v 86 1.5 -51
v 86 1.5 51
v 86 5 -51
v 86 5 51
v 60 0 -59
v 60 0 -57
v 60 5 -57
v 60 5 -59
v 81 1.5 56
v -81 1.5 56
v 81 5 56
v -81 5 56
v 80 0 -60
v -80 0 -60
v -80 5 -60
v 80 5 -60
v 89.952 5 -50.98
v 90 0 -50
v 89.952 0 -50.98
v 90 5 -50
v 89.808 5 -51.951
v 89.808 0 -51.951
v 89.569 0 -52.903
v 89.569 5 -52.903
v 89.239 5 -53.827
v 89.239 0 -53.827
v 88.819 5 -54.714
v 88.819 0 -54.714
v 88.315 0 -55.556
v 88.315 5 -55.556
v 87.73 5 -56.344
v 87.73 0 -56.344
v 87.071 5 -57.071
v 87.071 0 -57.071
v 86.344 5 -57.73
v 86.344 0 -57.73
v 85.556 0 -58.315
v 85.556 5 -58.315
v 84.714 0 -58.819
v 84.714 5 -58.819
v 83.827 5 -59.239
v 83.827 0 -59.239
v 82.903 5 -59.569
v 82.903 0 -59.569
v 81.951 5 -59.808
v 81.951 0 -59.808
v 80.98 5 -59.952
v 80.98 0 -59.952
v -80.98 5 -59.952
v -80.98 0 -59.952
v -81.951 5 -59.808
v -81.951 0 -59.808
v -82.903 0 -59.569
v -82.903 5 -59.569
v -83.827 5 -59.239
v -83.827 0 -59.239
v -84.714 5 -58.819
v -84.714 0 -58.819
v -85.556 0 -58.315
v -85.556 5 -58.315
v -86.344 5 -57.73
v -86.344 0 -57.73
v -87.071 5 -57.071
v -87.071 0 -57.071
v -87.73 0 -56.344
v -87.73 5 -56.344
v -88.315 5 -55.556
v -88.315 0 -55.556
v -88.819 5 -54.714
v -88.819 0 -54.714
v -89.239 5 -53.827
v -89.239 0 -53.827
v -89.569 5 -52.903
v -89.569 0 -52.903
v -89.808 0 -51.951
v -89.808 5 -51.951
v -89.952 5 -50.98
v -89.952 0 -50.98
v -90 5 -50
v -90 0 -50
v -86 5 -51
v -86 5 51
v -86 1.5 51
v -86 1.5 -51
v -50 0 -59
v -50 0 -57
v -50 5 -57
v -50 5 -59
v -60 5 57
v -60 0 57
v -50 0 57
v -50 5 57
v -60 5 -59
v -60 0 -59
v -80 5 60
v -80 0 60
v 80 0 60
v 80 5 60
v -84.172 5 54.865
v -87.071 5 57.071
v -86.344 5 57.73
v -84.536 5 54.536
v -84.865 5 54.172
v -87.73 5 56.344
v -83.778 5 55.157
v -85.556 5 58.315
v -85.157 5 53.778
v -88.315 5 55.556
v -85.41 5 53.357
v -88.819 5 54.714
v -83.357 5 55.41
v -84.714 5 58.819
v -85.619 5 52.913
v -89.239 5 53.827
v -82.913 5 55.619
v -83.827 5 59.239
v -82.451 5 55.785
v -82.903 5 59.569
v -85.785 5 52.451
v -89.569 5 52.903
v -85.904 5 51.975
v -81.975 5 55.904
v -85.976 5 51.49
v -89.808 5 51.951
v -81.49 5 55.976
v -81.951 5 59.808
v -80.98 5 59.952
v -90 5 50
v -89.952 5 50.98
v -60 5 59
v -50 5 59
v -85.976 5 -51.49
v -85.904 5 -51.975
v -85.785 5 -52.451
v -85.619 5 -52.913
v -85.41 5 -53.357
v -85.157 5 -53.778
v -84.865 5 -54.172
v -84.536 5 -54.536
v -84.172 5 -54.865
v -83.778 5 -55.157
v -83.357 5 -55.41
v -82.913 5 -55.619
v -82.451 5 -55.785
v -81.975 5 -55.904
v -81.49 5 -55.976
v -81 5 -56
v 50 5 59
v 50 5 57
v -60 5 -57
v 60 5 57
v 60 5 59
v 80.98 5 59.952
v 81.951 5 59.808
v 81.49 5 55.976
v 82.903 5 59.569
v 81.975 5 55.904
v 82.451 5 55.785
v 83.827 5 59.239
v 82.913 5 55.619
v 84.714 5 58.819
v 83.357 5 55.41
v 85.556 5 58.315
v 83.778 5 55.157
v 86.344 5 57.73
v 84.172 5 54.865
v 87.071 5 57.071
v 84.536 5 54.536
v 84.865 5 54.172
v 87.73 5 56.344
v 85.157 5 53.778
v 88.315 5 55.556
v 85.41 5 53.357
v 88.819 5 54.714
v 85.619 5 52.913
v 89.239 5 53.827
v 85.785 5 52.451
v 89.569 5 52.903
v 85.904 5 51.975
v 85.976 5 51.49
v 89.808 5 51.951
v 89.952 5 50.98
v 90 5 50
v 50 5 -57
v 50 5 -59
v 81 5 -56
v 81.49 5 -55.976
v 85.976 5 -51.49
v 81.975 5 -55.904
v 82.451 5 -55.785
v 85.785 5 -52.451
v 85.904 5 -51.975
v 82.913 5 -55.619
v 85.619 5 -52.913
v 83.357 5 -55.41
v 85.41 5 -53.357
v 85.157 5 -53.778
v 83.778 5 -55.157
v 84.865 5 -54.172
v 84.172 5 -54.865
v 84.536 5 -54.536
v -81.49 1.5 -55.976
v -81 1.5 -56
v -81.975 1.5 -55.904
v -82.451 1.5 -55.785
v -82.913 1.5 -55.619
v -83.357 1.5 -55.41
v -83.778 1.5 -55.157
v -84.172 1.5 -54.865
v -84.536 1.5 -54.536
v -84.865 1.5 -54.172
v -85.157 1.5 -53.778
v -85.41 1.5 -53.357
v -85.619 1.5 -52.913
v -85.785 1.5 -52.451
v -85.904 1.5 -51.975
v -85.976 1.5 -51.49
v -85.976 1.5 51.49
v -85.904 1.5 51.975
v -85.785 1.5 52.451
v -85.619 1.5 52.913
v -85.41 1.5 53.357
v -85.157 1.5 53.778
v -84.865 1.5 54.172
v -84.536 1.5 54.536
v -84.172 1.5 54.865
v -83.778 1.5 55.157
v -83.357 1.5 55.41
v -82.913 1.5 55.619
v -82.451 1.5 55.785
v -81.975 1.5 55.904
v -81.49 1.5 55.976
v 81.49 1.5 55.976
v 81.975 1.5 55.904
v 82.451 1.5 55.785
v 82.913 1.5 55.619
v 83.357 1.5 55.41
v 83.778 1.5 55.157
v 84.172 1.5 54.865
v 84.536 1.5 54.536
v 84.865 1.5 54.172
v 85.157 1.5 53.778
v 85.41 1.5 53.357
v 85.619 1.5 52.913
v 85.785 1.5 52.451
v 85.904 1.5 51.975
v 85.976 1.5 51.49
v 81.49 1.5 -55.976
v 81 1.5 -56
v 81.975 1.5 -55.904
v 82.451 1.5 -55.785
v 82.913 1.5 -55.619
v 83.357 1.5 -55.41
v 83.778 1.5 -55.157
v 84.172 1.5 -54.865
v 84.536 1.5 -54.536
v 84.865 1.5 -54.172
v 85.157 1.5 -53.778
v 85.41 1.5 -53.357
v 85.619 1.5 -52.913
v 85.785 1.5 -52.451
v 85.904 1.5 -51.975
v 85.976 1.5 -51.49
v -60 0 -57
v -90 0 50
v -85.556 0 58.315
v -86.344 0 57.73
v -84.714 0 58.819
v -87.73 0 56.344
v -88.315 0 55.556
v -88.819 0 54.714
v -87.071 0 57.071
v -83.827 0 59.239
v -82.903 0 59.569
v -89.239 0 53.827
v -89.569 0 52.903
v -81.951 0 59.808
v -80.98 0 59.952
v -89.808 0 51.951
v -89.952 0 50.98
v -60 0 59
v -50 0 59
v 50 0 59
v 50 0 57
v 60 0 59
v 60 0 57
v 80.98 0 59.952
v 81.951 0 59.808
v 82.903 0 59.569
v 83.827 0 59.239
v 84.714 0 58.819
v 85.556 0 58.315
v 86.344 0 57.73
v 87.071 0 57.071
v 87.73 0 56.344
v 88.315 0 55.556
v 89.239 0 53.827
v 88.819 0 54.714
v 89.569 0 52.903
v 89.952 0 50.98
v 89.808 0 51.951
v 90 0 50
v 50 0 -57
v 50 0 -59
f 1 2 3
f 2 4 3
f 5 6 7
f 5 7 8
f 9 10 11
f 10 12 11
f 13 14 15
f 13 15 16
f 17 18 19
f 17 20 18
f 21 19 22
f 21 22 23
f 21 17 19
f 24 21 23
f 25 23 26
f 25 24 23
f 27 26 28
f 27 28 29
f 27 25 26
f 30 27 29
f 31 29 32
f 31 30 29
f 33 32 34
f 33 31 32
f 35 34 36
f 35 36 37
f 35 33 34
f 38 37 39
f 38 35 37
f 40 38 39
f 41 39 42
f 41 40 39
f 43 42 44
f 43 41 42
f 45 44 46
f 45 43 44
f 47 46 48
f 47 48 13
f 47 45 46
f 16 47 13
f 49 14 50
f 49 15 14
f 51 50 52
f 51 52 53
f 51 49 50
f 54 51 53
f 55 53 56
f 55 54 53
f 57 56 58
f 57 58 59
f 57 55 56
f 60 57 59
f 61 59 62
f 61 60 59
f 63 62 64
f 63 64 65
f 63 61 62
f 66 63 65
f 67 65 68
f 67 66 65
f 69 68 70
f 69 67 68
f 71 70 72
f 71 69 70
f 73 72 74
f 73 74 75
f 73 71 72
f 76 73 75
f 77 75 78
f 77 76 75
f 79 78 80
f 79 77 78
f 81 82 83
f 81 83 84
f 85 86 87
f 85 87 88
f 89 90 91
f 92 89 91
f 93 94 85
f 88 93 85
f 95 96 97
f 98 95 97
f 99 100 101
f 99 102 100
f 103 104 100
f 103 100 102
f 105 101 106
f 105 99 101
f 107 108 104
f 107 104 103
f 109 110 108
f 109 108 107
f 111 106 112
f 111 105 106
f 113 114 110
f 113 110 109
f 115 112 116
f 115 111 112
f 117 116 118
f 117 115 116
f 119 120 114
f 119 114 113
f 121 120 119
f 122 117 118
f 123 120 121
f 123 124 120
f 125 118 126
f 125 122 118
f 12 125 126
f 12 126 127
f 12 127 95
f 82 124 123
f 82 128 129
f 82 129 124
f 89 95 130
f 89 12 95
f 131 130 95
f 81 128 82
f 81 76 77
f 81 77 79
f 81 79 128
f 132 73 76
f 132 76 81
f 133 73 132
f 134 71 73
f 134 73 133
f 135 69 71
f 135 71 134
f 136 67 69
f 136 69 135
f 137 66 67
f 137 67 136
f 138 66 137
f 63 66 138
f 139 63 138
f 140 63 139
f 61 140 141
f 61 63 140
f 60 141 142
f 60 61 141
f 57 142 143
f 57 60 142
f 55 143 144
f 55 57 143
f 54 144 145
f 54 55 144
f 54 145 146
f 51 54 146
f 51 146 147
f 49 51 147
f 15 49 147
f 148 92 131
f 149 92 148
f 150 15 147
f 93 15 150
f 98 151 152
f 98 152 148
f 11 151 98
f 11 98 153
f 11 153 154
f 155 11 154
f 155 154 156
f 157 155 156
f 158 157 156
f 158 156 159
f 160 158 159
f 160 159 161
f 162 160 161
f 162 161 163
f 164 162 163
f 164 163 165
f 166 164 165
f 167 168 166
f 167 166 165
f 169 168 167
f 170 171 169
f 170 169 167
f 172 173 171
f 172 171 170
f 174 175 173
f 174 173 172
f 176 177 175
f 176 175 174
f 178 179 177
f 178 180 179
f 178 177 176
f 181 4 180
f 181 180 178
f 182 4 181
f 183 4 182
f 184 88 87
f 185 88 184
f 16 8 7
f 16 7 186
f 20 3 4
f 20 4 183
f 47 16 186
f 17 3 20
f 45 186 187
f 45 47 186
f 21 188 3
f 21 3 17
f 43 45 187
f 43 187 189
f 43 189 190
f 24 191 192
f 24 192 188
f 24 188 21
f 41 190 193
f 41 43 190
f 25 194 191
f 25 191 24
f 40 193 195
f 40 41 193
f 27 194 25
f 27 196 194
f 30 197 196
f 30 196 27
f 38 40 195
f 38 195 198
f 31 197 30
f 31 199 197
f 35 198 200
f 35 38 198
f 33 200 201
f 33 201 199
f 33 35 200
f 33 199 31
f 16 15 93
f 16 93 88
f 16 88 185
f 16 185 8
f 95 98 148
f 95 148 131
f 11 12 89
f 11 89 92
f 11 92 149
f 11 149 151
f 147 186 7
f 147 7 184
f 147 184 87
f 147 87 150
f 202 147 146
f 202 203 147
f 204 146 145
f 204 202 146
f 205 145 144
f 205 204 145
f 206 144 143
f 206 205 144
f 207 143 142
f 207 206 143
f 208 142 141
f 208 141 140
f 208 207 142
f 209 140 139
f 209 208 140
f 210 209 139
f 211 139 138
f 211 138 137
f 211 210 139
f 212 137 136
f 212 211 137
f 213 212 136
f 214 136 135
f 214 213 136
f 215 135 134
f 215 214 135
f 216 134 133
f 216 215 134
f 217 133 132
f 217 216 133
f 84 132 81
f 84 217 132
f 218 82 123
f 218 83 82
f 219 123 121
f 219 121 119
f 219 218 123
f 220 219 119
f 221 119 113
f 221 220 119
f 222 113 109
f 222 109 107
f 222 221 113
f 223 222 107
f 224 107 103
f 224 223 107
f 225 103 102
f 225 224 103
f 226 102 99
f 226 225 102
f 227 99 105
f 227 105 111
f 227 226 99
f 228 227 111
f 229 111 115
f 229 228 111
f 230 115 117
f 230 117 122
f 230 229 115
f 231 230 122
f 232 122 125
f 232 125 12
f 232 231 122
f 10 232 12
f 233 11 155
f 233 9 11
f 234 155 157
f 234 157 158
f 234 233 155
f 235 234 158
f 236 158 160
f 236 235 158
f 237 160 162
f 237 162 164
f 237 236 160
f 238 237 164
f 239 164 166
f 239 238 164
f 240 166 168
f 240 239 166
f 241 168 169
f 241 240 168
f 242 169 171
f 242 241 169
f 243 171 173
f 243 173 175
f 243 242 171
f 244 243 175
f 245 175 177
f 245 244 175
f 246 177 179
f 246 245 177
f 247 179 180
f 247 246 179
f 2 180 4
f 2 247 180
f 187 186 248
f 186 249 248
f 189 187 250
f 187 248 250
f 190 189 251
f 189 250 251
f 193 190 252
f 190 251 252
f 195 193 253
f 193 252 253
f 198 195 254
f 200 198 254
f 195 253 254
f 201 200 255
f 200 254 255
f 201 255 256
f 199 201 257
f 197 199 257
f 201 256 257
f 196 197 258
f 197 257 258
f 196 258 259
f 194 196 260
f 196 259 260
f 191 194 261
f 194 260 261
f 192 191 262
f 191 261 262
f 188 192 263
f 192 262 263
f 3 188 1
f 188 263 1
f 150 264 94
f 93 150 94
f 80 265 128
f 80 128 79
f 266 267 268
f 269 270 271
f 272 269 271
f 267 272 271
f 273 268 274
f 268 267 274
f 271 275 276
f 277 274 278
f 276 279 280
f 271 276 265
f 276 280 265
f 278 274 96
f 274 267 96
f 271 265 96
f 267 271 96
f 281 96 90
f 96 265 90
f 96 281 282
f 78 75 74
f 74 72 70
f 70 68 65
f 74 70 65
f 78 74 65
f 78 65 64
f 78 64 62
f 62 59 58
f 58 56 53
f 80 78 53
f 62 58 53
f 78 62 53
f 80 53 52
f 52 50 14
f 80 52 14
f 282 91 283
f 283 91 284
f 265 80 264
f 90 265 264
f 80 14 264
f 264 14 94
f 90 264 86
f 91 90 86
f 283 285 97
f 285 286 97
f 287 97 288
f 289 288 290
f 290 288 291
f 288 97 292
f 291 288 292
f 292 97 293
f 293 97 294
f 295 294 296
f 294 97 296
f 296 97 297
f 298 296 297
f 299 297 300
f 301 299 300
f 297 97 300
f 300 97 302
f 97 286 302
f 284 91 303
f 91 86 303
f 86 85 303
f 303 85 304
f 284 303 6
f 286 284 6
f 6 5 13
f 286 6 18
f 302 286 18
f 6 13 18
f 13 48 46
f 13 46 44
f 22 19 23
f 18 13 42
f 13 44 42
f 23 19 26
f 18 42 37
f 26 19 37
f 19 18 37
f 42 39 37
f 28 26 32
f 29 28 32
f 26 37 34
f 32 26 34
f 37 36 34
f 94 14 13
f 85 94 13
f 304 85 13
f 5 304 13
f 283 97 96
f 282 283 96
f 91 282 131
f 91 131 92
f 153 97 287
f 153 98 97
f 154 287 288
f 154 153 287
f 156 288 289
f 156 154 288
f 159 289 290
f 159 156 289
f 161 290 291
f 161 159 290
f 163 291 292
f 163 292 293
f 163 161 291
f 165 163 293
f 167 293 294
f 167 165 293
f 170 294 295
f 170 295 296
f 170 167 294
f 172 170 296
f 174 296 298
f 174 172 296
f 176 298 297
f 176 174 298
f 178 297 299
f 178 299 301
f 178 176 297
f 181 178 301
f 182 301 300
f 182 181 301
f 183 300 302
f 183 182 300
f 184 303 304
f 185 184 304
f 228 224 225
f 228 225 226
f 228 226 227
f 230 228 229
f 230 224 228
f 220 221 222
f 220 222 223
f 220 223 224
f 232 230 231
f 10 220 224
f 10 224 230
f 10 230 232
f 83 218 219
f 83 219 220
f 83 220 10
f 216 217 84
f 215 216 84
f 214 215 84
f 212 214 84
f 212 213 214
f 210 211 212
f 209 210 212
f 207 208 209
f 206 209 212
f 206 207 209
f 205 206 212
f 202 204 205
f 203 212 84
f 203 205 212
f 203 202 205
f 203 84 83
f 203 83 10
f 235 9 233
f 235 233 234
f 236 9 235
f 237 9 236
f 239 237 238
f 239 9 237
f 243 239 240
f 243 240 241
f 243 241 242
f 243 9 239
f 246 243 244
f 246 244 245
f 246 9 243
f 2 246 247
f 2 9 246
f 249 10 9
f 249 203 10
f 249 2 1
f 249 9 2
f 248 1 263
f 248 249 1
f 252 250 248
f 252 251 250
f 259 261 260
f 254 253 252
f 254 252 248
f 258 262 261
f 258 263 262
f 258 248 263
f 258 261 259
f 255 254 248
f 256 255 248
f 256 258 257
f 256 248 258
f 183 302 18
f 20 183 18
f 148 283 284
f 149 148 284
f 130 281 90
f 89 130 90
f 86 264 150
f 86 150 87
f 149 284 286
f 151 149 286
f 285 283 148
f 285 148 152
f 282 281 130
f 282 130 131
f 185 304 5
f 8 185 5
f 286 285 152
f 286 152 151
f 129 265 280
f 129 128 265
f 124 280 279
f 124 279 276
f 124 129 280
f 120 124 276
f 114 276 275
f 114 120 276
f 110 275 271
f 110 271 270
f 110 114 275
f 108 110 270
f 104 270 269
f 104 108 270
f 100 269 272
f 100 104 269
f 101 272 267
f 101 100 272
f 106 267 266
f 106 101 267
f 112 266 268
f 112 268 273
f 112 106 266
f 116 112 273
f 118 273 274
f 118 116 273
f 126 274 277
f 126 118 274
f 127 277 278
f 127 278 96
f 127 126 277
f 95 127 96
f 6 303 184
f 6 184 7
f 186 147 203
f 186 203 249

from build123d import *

# Parameters (mm, degrees)
SKETCH1_W           = 180
SKETCH1_H           = 120
BOSS_EXTRUDE1_DEPTH = 5
FILLET1_R           = 10
FILLET2_R           = 10
FILLET3_R           = 10
FILLET4_R           = 10
SHELL1_T            = -4
SKETCH6_W           = 172
SKETCH6_H           = 112
CUT_EXTRUDE1_DEPTH  = 8.5
FILLET5_R           = 5
FILLET6_R           = 5
FILLET7_R           = 5
FILLET8_R           = 5
SKETCH8_W           = 10
SKETCH8_H           = 2
CUT_EXTRUDE2_DEPTH  = 8


with BuildPart() as part:
    # Sketch1 → Boss-Extrude1 (new body)
    with BuildSketch(Plane(origin=(0, 0, 0), x_dir=(1, 0, 0), z_dir=(0, 1, 0))):
        Rectangle(SKETCH1_W, SKETCH1_H)
    extrude(amount=BOSS_EXTRUDE1_DEPTH)

    # Fillet1
    fillet1_edges = [part.edges().sort_by_distance(p)[0] for p in [
        (-90, 2.5, 60),
    ]]
    fillet(fillet1_edges, radius=FILLET1_R)

    # Fillet2
    fillet2_edges = [part.edges().sort_by_distance(p)[0] for p in [
        (90, 2.5, 60),
    ]]
    fillet(fillet2_edges, radius=FILLET2_R)

    # Fillet3
    fillet3_edges = [part.edges().sort_by_distance(p)[0] for p in [
        (90, 2.5, -60),
    ]]
    fillet(fillet3_edges, radius=FILLET3_R)

    # Fillet4
    fillet4_edges = [part.edges().sort_by_distance(p)[0] for p in [
        (-90, 2.5, -60),
    ]]
    fillet(fillet4_edges, radius=FILLET4_R)

    # Shell1
    shell1_openings = [part.faces().sort_by_distance(p)[0] for p in [
        (0, 5, 0),
    ]]
    offset(amount=SHELL1_T, openings=shell1_openings, kind=Kind.INTERSECTION)

    # Sketch6 → Cut-Extrude1 (cut)
    with BuildSketch(Plane(origin=(0, 10, 0), x_dir=(1, 0, 0), z_dir=(0, 1, 0))):
        Rectangle(SKETCH6_W, SKETCH6_H)
    extrude(amount=-CUT_EXTRUDE1_DEPTH, mode=Mode.SUBTRACT)

    # Fillet5
    fillet5_edges = [part.edges().sort_by_distance(p)[0] for p in [
        (-86, 3.25, -56),
    ]]
    fillet(fillet5_edges, radius=FILLET5_R)

    # Fillet6
    fillet6_edges = [part.edges().sort_by_distance(p)[0] for p in [
        (86, 3.25, -56),
    ]]
    fillet(fillet6_edges, radius=FILLET6_R)

    # Fillet7
    fillet7_edges = [part.edges().sort_by_distance(p)[0] for p in [
        (-86, 3.25, 56),
    ]]
    fillet(fillet7_edges, radius=FILLET7_R)

    # Fillet8
    fillet8_edges = [part.edges().sort_by_distance(p)[0] for p in [
        (86, 3.25, 56),
    ]]
    fillet(fillet8_edges, radius=FILLET8_R)

    # Sketch8 → Cut-Extrude2 (cut)
    with BuildSketch(Plane(origin=(0, 0, 0), x_dir=(1, 0, 0), z_dir=(0, 1, 0))):
        with Locations((-55, 58)):
            Rectangle(SKETCH8_W, SKETCH8_H)
        with Locations((55, 58)):
            Rectangle(SKETCH8_W, SKETCH8_H)
        with Locations((55, -58)):
            Rectangle(SKETCH8_W, SKETCH8_H)
        with Locations((-55, -58)):
            Rectangle(SKETCH8_W, SKETCH8_H)
    extrude(amount=CUT_EXTRUDE2_DEPTH, mode=Mode.SUBTRACT)


solid = part.part
